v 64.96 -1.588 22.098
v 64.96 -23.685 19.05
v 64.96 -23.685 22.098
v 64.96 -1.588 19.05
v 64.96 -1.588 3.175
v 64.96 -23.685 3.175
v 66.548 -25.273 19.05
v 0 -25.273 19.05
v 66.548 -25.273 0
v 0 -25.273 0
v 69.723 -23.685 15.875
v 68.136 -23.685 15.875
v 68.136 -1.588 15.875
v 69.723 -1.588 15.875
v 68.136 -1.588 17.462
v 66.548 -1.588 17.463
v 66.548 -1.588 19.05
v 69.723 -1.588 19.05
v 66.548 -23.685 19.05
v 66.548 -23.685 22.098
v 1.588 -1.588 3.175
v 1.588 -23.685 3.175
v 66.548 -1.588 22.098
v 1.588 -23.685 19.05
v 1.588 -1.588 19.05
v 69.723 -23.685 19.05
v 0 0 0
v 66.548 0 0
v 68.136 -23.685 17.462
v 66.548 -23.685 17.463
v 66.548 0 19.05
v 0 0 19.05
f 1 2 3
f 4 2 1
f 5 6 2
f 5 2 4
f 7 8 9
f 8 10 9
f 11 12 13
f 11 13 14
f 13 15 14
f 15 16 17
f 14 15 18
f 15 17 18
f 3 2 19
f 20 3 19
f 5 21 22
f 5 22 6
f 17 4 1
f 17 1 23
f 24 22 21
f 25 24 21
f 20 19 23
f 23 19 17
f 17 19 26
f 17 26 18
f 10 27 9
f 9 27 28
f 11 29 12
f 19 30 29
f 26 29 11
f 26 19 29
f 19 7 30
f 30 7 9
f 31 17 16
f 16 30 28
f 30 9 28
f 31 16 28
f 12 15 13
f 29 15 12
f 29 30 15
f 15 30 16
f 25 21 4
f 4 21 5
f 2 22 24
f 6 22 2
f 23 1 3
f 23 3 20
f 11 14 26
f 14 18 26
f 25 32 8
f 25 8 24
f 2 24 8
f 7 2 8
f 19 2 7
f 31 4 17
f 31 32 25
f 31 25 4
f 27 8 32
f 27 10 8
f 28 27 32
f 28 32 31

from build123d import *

# Parameters (mm, degrees)
F0_W     = 66.548
F0_H     = 25.273
F1_DEPTH = 3.175
F2_W     = 66.548
F2_H     = 25.273
F2_W_2   = 63.373
F2_H_2   = 22.098
F3_DEPTH = 15.875
F4_W     = 1.5875
F4_H     = 22.098
F5_DEPTH = 3.048
F6_W     = 22.098
F6_H     = 1.5875
F7_DEPTH = 3.175
F8_W     = 1.5875
F8_H     = 22.098
F9_DEPTH = 1.5875


with BuildPart() as f1:
    # F0 (on Top) → F1 (new body)
    with BuildSketch(Plane.XY):
        with Locations((33.274, -12.6365)):
            Rectangle(F0_W, F0_H)
    extrude(amount=F1_DEPTH)

    # F2 (on face) → F3 (join)
    with BuildSketch(Plane.XY.offset(3.175)):
        with Locations((33.274, -12.6365)):
            Rectangle(F2_W, F2_H)
        with Locations((33.274, -12.6365)):
            Rectangle(F2_W_2, F2_H_2, mode=Mode.SUBTRACT)
    extrude(amount=F3_DEPTH)

    # F4 (on face) → F5 (join)
    with BuildSketch(Plane.XY.offset(19.05)):
        with Locations((65.75425, -12.6365)):
            Rectangle(F4_W, F4_H)
    extrude(amount=F5_DEPTH)

    # F6 (on face) → F7 (join)
    with BuildSketch(Plane.YZ.offset(66.548)):
        with Locations((-12.6365, 18.25625)):
            Rectangle(F6_W, F6_H)
    extrude(amount=F7_DEPTH)

    # F8 (on face) → F9 (join)
    with BuildSketch(Plane(origin=(0, 0, 17.4625), x_dir=(1, 0, 0), z_dir=(0, 0, -1))):
        with Locations((68.92925, 12.6365)):
            Rectangle(F8_W, F8_H)
    extrude(amount=F9_DEPTH)


solid = f1.part
